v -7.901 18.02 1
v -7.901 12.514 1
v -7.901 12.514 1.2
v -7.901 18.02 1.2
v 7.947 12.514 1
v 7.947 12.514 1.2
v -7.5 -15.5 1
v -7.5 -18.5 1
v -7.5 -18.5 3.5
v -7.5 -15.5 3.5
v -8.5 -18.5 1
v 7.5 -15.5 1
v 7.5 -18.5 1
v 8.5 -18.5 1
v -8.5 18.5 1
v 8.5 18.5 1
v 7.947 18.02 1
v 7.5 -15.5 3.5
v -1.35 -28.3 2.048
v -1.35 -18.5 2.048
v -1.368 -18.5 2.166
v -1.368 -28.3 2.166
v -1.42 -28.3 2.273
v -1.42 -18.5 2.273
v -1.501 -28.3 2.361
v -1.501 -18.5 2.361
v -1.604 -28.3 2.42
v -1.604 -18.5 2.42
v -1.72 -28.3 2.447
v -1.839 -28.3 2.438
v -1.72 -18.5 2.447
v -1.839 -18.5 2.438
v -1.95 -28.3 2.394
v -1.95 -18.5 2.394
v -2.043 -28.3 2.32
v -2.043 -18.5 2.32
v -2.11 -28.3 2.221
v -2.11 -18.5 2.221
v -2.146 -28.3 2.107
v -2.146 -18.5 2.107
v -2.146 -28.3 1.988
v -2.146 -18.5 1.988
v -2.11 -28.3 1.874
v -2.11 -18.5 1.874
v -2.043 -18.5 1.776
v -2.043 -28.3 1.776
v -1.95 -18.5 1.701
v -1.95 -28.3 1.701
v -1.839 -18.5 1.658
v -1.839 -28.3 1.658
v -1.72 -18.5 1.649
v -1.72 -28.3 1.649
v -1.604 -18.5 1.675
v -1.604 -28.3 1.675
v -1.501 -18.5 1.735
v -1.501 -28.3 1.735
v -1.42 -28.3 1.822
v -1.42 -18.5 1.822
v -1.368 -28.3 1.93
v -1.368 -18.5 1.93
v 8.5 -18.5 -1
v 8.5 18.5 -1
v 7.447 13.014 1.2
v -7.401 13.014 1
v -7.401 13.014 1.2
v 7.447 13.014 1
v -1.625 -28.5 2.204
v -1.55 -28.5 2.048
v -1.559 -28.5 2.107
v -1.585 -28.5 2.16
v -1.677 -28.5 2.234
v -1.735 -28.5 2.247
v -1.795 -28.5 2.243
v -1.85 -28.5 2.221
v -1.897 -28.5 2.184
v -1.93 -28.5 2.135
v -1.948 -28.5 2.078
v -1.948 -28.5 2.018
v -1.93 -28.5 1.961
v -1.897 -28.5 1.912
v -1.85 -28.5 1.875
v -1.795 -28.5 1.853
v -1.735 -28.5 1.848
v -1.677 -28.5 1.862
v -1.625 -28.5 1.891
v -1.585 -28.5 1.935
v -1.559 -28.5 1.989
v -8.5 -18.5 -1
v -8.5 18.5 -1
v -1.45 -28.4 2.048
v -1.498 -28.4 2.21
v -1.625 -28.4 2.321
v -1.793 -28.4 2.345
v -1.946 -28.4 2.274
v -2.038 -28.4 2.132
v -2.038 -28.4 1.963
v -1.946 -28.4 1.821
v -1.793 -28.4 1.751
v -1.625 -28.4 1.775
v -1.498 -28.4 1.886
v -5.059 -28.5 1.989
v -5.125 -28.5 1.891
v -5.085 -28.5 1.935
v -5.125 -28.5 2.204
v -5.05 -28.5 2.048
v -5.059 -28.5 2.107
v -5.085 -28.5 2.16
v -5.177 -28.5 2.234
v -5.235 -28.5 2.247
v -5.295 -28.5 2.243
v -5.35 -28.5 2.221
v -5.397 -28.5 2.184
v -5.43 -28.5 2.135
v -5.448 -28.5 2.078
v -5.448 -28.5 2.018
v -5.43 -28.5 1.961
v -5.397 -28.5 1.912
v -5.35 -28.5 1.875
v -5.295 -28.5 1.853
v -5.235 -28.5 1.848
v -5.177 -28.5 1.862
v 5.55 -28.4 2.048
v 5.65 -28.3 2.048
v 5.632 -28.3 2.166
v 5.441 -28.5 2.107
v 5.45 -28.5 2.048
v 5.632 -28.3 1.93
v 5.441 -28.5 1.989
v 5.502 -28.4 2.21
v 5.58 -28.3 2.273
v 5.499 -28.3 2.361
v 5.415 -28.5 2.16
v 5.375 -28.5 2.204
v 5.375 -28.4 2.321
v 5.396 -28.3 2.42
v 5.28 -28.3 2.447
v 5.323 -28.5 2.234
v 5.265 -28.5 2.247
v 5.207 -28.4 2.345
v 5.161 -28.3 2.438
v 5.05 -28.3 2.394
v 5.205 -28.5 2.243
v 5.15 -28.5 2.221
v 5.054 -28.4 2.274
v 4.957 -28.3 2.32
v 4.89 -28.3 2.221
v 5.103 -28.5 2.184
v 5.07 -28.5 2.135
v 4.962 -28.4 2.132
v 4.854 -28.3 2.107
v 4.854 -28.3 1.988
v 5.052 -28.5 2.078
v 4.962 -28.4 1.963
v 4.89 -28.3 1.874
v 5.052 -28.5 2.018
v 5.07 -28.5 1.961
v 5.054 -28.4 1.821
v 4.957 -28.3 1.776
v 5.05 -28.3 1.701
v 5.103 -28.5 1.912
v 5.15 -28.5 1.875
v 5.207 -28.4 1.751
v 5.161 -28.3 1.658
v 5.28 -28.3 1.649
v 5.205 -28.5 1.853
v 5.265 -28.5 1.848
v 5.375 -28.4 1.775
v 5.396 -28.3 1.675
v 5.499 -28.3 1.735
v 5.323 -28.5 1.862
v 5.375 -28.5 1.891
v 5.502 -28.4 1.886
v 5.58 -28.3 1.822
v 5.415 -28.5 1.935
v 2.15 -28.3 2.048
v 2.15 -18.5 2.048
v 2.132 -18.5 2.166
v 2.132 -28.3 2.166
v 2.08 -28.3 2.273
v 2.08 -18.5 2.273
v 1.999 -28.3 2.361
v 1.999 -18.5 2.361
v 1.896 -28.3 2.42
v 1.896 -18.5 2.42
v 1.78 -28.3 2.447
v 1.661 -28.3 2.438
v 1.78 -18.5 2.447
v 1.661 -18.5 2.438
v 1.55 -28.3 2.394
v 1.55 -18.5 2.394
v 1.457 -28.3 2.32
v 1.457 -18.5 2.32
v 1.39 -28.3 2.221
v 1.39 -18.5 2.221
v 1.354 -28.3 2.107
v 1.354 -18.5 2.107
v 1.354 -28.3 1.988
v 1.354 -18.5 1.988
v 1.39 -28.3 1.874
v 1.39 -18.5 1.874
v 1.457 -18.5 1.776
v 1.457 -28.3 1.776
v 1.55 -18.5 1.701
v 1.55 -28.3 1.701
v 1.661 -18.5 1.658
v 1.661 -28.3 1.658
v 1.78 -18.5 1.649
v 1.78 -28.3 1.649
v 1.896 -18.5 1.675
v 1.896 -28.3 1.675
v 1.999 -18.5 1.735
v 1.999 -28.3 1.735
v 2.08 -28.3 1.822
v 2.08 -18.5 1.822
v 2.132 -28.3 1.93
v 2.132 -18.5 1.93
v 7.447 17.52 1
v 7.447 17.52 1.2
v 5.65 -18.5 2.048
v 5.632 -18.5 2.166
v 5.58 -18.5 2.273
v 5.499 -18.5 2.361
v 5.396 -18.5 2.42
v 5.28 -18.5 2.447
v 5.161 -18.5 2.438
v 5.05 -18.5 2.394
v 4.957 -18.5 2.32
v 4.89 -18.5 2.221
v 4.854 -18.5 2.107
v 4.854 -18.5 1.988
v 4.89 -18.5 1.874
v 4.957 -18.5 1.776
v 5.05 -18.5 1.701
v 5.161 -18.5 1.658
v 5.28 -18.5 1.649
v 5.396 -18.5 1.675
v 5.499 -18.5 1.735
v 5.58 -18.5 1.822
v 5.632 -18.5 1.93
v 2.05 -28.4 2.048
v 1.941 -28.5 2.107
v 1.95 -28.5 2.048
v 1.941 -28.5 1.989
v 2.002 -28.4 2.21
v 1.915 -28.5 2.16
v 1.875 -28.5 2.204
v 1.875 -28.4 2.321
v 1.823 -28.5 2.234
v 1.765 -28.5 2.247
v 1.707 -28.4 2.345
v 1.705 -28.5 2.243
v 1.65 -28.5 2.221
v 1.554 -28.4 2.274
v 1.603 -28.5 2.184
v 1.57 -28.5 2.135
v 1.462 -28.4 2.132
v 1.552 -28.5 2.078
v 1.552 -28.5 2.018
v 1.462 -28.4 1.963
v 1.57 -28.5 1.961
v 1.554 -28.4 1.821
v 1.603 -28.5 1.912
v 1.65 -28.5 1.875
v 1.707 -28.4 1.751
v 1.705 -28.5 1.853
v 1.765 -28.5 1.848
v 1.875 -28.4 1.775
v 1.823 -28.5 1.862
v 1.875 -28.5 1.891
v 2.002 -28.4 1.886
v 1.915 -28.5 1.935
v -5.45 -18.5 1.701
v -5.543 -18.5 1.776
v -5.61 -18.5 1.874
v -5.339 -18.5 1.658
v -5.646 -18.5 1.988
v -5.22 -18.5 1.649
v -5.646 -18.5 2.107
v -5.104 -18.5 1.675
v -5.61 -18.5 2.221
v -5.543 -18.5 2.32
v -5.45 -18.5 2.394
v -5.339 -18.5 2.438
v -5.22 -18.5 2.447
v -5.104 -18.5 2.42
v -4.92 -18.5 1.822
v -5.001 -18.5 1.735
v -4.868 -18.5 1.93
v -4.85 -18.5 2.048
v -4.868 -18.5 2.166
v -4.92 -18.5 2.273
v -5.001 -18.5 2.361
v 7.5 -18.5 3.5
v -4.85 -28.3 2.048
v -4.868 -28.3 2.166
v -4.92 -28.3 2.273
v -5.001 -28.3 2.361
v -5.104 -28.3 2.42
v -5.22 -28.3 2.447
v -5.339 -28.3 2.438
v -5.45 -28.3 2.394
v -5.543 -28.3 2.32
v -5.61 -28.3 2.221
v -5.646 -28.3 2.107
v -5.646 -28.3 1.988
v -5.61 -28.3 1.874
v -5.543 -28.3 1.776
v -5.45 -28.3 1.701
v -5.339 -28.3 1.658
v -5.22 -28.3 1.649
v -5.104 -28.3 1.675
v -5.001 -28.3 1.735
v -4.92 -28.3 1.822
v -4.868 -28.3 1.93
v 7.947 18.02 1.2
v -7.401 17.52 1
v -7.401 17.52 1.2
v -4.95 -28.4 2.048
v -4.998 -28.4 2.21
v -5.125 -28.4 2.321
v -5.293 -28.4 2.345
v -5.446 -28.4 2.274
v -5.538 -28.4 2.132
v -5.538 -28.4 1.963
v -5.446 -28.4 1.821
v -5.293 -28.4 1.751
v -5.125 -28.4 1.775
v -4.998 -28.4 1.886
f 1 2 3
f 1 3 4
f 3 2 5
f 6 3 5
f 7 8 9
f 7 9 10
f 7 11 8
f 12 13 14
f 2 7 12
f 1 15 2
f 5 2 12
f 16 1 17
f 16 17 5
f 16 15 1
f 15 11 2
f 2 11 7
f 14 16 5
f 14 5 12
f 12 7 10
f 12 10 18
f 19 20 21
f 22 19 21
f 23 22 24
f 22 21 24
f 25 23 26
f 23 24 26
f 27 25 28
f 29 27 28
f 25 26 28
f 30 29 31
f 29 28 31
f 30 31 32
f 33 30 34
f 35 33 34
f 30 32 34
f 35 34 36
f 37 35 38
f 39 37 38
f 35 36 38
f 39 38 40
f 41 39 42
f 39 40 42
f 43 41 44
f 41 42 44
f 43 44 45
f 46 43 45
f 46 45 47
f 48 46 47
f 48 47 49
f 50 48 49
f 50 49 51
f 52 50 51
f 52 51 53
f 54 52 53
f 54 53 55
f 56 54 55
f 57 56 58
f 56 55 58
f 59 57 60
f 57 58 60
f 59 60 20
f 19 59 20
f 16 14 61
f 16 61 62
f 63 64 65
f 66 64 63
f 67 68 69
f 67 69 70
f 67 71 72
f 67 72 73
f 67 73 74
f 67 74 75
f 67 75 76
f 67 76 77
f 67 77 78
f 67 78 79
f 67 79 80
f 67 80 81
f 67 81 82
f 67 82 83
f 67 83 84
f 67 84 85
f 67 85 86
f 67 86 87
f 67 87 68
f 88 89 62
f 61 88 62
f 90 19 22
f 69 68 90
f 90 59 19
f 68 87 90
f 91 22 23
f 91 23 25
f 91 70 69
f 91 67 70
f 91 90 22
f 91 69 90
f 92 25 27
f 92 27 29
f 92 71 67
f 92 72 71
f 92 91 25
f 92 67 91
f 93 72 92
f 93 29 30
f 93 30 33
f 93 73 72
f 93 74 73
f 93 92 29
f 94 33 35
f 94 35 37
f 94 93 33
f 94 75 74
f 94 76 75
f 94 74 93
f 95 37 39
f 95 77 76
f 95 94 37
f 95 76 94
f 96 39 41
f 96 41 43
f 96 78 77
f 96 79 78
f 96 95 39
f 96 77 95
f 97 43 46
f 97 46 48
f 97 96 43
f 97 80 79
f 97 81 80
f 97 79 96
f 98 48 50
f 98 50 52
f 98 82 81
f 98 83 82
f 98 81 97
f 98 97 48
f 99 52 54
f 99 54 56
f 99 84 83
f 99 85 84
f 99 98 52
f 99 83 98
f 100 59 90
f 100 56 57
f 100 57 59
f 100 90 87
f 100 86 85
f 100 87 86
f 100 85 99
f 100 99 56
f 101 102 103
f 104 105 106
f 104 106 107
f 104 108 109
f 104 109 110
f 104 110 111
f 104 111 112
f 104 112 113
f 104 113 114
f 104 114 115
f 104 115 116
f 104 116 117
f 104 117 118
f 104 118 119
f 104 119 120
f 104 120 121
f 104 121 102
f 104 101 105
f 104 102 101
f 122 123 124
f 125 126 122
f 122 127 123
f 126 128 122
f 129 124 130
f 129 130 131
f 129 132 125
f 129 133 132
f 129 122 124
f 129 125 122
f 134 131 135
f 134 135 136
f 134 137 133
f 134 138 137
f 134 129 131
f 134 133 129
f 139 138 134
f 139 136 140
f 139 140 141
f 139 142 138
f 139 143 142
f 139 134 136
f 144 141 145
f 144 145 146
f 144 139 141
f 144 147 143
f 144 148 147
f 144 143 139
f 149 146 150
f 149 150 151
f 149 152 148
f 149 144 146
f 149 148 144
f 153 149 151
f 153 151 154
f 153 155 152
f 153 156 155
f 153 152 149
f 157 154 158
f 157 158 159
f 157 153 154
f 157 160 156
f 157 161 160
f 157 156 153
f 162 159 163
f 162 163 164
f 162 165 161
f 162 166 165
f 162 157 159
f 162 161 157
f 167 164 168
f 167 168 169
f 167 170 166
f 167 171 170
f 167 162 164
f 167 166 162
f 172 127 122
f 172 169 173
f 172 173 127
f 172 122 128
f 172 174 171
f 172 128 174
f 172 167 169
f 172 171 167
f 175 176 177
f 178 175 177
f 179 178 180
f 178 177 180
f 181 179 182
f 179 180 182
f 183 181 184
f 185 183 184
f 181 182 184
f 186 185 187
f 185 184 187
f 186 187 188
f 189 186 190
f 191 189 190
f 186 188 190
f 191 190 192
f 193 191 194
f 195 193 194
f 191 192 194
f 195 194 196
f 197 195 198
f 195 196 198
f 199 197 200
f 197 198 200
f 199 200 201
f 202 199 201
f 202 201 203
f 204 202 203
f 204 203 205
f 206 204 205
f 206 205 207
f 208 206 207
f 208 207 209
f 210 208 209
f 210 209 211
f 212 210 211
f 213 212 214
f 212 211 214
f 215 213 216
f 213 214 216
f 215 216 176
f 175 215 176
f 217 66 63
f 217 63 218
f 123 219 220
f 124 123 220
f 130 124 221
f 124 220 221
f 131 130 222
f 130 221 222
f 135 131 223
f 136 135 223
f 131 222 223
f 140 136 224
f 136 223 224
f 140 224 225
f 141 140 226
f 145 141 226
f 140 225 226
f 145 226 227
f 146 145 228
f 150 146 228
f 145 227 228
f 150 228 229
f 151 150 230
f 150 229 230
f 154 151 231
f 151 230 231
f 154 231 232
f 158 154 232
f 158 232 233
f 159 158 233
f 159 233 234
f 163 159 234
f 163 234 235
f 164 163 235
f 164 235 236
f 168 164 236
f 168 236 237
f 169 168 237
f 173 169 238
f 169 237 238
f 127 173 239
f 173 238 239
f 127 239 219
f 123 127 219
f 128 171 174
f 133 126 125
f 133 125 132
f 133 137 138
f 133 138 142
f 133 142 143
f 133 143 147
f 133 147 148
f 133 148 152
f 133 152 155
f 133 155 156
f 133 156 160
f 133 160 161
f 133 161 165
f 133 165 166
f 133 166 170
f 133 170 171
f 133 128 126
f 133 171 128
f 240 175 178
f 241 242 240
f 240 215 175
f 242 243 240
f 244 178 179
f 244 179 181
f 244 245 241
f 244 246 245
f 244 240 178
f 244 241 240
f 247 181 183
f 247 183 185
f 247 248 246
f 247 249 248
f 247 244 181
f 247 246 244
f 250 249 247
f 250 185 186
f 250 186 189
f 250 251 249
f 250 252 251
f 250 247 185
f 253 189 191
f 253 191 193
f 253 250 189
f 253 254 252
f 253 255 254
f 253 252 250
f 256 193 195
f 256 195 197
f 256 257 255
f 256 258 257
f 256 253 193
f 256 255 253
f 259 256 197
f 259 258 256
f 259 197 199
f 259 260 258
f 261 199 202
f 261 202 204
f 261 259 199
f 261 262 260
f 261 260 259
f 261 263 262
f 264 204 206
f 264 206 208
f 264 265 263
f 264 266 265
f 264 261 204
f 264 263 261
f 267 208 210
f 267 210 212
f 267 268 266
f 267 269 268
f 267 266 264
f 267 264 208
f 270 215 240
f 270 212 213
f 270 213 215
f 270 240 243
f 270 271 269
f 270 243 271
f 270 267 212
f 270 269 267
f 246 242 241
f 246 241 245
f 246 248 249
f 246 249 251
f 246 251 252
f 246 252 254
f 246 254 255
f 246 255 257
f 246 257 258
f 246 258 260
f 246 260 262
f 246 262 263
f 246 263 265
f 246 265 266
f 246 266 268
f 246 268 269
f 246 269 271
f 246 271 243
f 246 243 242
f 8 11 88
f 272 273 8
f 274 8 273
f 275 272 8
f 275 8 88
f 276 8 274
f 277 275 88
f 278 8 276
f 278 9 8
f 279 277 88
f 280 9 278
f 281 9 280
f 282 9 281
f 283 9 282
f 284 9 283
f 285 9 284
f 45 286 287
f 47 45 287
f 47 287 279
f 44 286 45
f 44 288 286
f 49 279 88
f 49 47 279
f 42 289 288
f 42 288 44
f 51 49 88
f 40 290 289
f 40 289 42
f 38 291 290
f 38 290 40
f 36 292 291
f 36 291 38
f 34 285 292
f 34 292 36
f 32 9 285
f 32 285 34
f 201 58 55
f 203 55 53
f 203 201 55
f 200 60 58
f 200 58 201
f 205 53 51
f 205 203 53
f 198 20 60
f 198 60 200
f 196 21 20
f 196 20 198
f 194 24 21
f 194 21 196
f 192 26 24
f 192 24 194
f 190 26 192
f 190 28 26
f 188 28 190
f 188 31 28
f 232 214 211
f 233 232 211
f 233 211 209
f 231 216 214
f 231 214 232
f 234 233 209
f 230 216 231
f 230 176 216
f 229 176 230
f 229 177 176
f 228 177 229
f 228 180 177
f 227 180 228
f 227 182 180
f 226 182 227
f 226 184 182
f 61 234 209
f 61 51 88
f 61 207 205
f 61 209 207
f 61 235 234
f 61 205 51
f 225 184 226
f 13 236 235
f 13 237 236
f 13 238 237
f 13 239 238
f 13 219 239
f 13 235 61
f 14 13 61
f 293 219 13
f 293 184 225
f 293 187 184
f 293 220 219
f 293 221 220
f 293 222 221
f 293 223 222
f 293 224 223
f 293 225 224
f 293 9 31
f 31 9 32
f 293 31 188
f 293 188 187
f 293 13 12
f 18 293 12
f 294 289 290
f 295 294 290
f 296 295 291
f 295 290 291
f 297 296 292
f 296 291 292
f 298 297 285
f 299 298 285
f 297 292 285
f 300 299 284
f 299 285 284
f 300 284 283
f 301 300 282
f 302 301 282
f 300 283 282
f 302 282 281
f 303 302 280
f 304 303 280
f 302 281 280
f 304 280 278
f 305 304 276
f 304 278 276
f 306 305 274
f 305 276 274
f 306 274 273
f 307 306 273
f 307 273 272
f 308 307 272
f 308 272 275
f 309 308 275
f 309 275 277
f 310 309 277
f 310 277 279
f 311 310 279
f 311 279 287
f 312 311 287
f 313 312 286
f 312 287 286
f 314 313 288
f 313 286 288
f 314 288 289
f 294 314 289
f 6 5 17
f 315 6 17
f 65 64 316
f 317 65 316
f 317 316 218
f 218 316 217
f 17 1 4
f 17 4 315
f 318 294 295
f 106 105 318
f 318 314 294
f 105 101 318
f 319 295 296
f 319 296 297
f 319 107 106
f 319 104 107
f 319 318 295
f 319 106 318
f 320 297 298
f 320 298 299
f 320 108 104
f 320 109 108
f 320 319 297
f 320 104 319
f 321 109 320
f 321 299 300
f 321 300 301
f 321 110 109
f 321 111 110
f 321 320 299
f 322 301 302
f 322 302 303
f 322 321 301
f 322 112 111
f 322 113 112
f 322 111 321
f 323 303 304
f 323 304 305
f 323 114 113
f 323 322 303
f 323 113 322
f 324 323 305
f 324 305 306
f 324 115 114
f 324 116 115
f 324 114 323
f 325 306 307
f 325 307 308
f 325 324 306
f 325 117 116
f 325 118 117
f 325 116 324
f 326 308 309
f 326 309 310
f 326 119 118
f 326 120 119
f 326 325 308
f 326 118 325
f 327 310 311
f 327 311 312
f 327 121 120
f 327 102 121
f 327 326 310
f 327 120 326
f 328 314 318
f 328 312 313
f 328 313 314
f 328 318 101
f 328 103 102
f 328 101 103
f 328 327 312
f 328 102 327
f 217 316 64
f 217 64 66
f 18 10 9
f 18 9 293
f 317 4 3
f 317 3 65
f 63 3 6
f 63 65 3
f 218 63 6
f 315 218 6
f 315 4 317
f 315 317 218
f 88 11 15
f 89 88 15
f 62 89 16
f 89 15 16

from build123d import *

# Parameters (mm, degrees)
F0_W     = 17
F0_H     = 37
F1_DEPTH = 1
F2_W     = 15
F2_H     = 3
F3_DEPTH = 2.5
F4_R     = 0.4
F5_DEPTH = 10
F6_SIZE  = 0.2
F7_W     = 15.8485004902
F7_H     = 5.5060135201
F7_W_2   = 14.8485004902
F7_H_2   = 4.5060135201
F8_DEPTH = 0.2


with BuildPart() as f1:
    # F0 (on Top) → F1 (new body, symmetric)
    with BuildSketch(Plane.XY):
        Rectangle(F0_W, F0_H)
    extrude(amount=F1_DEPTH, both=True)

    # F2 (on face) → F3 (join)
    with BuildSketch(Plane.XY.offset(1)):
        with Locations((0, -17)):
            Rectangle(F2_W, F2_H)
    extrude(amount=F3_DEPTH)

    # F4 (on face) → F5 (join)
    with BuildSketch(Plane.XZ.offset(18.5)):
        with Locations((-5.25, 2.0477680955)):
            Circle(F4_R)
        with Locations((-1.75, 2.0477680955)):
            Circle(F4_R)
        with Locations((1.75, 2.0477680955)):
            Circle(F4_R)
        with Locations((5.25, 2.0477680955)):
            Circle(F4_R)
    extrude(amount=F5_DEPTH)

    # F6
    f6_edges = [f1.edges().sort_by_distance(p)[0] for p in [
        (-5.65, -28.5, 2.047768),
        (-2.15, -28.5, 2.047768),
        (1.35, -28.5, 2.047768),
        (4.85, -28.5, 2.047768),
    ]]
    chamfer(f6_edges, length=F6_SIZE)

    # F7 (on face) → F8 (join)
    with BuildSketch(Plane.XY.offset(1)):
        with Locations((0.0227517448, 15.2666731738)):
            Rectangle(F7_W, F7_H)
        with Locations((0.0227517448, 15.2666731738)):
            Rectangle(F7_W_2, F7_H_2, mode=Mode.SUBTRACT)
    extrude(amount=F8_DEPTH)


solid = f1.part
